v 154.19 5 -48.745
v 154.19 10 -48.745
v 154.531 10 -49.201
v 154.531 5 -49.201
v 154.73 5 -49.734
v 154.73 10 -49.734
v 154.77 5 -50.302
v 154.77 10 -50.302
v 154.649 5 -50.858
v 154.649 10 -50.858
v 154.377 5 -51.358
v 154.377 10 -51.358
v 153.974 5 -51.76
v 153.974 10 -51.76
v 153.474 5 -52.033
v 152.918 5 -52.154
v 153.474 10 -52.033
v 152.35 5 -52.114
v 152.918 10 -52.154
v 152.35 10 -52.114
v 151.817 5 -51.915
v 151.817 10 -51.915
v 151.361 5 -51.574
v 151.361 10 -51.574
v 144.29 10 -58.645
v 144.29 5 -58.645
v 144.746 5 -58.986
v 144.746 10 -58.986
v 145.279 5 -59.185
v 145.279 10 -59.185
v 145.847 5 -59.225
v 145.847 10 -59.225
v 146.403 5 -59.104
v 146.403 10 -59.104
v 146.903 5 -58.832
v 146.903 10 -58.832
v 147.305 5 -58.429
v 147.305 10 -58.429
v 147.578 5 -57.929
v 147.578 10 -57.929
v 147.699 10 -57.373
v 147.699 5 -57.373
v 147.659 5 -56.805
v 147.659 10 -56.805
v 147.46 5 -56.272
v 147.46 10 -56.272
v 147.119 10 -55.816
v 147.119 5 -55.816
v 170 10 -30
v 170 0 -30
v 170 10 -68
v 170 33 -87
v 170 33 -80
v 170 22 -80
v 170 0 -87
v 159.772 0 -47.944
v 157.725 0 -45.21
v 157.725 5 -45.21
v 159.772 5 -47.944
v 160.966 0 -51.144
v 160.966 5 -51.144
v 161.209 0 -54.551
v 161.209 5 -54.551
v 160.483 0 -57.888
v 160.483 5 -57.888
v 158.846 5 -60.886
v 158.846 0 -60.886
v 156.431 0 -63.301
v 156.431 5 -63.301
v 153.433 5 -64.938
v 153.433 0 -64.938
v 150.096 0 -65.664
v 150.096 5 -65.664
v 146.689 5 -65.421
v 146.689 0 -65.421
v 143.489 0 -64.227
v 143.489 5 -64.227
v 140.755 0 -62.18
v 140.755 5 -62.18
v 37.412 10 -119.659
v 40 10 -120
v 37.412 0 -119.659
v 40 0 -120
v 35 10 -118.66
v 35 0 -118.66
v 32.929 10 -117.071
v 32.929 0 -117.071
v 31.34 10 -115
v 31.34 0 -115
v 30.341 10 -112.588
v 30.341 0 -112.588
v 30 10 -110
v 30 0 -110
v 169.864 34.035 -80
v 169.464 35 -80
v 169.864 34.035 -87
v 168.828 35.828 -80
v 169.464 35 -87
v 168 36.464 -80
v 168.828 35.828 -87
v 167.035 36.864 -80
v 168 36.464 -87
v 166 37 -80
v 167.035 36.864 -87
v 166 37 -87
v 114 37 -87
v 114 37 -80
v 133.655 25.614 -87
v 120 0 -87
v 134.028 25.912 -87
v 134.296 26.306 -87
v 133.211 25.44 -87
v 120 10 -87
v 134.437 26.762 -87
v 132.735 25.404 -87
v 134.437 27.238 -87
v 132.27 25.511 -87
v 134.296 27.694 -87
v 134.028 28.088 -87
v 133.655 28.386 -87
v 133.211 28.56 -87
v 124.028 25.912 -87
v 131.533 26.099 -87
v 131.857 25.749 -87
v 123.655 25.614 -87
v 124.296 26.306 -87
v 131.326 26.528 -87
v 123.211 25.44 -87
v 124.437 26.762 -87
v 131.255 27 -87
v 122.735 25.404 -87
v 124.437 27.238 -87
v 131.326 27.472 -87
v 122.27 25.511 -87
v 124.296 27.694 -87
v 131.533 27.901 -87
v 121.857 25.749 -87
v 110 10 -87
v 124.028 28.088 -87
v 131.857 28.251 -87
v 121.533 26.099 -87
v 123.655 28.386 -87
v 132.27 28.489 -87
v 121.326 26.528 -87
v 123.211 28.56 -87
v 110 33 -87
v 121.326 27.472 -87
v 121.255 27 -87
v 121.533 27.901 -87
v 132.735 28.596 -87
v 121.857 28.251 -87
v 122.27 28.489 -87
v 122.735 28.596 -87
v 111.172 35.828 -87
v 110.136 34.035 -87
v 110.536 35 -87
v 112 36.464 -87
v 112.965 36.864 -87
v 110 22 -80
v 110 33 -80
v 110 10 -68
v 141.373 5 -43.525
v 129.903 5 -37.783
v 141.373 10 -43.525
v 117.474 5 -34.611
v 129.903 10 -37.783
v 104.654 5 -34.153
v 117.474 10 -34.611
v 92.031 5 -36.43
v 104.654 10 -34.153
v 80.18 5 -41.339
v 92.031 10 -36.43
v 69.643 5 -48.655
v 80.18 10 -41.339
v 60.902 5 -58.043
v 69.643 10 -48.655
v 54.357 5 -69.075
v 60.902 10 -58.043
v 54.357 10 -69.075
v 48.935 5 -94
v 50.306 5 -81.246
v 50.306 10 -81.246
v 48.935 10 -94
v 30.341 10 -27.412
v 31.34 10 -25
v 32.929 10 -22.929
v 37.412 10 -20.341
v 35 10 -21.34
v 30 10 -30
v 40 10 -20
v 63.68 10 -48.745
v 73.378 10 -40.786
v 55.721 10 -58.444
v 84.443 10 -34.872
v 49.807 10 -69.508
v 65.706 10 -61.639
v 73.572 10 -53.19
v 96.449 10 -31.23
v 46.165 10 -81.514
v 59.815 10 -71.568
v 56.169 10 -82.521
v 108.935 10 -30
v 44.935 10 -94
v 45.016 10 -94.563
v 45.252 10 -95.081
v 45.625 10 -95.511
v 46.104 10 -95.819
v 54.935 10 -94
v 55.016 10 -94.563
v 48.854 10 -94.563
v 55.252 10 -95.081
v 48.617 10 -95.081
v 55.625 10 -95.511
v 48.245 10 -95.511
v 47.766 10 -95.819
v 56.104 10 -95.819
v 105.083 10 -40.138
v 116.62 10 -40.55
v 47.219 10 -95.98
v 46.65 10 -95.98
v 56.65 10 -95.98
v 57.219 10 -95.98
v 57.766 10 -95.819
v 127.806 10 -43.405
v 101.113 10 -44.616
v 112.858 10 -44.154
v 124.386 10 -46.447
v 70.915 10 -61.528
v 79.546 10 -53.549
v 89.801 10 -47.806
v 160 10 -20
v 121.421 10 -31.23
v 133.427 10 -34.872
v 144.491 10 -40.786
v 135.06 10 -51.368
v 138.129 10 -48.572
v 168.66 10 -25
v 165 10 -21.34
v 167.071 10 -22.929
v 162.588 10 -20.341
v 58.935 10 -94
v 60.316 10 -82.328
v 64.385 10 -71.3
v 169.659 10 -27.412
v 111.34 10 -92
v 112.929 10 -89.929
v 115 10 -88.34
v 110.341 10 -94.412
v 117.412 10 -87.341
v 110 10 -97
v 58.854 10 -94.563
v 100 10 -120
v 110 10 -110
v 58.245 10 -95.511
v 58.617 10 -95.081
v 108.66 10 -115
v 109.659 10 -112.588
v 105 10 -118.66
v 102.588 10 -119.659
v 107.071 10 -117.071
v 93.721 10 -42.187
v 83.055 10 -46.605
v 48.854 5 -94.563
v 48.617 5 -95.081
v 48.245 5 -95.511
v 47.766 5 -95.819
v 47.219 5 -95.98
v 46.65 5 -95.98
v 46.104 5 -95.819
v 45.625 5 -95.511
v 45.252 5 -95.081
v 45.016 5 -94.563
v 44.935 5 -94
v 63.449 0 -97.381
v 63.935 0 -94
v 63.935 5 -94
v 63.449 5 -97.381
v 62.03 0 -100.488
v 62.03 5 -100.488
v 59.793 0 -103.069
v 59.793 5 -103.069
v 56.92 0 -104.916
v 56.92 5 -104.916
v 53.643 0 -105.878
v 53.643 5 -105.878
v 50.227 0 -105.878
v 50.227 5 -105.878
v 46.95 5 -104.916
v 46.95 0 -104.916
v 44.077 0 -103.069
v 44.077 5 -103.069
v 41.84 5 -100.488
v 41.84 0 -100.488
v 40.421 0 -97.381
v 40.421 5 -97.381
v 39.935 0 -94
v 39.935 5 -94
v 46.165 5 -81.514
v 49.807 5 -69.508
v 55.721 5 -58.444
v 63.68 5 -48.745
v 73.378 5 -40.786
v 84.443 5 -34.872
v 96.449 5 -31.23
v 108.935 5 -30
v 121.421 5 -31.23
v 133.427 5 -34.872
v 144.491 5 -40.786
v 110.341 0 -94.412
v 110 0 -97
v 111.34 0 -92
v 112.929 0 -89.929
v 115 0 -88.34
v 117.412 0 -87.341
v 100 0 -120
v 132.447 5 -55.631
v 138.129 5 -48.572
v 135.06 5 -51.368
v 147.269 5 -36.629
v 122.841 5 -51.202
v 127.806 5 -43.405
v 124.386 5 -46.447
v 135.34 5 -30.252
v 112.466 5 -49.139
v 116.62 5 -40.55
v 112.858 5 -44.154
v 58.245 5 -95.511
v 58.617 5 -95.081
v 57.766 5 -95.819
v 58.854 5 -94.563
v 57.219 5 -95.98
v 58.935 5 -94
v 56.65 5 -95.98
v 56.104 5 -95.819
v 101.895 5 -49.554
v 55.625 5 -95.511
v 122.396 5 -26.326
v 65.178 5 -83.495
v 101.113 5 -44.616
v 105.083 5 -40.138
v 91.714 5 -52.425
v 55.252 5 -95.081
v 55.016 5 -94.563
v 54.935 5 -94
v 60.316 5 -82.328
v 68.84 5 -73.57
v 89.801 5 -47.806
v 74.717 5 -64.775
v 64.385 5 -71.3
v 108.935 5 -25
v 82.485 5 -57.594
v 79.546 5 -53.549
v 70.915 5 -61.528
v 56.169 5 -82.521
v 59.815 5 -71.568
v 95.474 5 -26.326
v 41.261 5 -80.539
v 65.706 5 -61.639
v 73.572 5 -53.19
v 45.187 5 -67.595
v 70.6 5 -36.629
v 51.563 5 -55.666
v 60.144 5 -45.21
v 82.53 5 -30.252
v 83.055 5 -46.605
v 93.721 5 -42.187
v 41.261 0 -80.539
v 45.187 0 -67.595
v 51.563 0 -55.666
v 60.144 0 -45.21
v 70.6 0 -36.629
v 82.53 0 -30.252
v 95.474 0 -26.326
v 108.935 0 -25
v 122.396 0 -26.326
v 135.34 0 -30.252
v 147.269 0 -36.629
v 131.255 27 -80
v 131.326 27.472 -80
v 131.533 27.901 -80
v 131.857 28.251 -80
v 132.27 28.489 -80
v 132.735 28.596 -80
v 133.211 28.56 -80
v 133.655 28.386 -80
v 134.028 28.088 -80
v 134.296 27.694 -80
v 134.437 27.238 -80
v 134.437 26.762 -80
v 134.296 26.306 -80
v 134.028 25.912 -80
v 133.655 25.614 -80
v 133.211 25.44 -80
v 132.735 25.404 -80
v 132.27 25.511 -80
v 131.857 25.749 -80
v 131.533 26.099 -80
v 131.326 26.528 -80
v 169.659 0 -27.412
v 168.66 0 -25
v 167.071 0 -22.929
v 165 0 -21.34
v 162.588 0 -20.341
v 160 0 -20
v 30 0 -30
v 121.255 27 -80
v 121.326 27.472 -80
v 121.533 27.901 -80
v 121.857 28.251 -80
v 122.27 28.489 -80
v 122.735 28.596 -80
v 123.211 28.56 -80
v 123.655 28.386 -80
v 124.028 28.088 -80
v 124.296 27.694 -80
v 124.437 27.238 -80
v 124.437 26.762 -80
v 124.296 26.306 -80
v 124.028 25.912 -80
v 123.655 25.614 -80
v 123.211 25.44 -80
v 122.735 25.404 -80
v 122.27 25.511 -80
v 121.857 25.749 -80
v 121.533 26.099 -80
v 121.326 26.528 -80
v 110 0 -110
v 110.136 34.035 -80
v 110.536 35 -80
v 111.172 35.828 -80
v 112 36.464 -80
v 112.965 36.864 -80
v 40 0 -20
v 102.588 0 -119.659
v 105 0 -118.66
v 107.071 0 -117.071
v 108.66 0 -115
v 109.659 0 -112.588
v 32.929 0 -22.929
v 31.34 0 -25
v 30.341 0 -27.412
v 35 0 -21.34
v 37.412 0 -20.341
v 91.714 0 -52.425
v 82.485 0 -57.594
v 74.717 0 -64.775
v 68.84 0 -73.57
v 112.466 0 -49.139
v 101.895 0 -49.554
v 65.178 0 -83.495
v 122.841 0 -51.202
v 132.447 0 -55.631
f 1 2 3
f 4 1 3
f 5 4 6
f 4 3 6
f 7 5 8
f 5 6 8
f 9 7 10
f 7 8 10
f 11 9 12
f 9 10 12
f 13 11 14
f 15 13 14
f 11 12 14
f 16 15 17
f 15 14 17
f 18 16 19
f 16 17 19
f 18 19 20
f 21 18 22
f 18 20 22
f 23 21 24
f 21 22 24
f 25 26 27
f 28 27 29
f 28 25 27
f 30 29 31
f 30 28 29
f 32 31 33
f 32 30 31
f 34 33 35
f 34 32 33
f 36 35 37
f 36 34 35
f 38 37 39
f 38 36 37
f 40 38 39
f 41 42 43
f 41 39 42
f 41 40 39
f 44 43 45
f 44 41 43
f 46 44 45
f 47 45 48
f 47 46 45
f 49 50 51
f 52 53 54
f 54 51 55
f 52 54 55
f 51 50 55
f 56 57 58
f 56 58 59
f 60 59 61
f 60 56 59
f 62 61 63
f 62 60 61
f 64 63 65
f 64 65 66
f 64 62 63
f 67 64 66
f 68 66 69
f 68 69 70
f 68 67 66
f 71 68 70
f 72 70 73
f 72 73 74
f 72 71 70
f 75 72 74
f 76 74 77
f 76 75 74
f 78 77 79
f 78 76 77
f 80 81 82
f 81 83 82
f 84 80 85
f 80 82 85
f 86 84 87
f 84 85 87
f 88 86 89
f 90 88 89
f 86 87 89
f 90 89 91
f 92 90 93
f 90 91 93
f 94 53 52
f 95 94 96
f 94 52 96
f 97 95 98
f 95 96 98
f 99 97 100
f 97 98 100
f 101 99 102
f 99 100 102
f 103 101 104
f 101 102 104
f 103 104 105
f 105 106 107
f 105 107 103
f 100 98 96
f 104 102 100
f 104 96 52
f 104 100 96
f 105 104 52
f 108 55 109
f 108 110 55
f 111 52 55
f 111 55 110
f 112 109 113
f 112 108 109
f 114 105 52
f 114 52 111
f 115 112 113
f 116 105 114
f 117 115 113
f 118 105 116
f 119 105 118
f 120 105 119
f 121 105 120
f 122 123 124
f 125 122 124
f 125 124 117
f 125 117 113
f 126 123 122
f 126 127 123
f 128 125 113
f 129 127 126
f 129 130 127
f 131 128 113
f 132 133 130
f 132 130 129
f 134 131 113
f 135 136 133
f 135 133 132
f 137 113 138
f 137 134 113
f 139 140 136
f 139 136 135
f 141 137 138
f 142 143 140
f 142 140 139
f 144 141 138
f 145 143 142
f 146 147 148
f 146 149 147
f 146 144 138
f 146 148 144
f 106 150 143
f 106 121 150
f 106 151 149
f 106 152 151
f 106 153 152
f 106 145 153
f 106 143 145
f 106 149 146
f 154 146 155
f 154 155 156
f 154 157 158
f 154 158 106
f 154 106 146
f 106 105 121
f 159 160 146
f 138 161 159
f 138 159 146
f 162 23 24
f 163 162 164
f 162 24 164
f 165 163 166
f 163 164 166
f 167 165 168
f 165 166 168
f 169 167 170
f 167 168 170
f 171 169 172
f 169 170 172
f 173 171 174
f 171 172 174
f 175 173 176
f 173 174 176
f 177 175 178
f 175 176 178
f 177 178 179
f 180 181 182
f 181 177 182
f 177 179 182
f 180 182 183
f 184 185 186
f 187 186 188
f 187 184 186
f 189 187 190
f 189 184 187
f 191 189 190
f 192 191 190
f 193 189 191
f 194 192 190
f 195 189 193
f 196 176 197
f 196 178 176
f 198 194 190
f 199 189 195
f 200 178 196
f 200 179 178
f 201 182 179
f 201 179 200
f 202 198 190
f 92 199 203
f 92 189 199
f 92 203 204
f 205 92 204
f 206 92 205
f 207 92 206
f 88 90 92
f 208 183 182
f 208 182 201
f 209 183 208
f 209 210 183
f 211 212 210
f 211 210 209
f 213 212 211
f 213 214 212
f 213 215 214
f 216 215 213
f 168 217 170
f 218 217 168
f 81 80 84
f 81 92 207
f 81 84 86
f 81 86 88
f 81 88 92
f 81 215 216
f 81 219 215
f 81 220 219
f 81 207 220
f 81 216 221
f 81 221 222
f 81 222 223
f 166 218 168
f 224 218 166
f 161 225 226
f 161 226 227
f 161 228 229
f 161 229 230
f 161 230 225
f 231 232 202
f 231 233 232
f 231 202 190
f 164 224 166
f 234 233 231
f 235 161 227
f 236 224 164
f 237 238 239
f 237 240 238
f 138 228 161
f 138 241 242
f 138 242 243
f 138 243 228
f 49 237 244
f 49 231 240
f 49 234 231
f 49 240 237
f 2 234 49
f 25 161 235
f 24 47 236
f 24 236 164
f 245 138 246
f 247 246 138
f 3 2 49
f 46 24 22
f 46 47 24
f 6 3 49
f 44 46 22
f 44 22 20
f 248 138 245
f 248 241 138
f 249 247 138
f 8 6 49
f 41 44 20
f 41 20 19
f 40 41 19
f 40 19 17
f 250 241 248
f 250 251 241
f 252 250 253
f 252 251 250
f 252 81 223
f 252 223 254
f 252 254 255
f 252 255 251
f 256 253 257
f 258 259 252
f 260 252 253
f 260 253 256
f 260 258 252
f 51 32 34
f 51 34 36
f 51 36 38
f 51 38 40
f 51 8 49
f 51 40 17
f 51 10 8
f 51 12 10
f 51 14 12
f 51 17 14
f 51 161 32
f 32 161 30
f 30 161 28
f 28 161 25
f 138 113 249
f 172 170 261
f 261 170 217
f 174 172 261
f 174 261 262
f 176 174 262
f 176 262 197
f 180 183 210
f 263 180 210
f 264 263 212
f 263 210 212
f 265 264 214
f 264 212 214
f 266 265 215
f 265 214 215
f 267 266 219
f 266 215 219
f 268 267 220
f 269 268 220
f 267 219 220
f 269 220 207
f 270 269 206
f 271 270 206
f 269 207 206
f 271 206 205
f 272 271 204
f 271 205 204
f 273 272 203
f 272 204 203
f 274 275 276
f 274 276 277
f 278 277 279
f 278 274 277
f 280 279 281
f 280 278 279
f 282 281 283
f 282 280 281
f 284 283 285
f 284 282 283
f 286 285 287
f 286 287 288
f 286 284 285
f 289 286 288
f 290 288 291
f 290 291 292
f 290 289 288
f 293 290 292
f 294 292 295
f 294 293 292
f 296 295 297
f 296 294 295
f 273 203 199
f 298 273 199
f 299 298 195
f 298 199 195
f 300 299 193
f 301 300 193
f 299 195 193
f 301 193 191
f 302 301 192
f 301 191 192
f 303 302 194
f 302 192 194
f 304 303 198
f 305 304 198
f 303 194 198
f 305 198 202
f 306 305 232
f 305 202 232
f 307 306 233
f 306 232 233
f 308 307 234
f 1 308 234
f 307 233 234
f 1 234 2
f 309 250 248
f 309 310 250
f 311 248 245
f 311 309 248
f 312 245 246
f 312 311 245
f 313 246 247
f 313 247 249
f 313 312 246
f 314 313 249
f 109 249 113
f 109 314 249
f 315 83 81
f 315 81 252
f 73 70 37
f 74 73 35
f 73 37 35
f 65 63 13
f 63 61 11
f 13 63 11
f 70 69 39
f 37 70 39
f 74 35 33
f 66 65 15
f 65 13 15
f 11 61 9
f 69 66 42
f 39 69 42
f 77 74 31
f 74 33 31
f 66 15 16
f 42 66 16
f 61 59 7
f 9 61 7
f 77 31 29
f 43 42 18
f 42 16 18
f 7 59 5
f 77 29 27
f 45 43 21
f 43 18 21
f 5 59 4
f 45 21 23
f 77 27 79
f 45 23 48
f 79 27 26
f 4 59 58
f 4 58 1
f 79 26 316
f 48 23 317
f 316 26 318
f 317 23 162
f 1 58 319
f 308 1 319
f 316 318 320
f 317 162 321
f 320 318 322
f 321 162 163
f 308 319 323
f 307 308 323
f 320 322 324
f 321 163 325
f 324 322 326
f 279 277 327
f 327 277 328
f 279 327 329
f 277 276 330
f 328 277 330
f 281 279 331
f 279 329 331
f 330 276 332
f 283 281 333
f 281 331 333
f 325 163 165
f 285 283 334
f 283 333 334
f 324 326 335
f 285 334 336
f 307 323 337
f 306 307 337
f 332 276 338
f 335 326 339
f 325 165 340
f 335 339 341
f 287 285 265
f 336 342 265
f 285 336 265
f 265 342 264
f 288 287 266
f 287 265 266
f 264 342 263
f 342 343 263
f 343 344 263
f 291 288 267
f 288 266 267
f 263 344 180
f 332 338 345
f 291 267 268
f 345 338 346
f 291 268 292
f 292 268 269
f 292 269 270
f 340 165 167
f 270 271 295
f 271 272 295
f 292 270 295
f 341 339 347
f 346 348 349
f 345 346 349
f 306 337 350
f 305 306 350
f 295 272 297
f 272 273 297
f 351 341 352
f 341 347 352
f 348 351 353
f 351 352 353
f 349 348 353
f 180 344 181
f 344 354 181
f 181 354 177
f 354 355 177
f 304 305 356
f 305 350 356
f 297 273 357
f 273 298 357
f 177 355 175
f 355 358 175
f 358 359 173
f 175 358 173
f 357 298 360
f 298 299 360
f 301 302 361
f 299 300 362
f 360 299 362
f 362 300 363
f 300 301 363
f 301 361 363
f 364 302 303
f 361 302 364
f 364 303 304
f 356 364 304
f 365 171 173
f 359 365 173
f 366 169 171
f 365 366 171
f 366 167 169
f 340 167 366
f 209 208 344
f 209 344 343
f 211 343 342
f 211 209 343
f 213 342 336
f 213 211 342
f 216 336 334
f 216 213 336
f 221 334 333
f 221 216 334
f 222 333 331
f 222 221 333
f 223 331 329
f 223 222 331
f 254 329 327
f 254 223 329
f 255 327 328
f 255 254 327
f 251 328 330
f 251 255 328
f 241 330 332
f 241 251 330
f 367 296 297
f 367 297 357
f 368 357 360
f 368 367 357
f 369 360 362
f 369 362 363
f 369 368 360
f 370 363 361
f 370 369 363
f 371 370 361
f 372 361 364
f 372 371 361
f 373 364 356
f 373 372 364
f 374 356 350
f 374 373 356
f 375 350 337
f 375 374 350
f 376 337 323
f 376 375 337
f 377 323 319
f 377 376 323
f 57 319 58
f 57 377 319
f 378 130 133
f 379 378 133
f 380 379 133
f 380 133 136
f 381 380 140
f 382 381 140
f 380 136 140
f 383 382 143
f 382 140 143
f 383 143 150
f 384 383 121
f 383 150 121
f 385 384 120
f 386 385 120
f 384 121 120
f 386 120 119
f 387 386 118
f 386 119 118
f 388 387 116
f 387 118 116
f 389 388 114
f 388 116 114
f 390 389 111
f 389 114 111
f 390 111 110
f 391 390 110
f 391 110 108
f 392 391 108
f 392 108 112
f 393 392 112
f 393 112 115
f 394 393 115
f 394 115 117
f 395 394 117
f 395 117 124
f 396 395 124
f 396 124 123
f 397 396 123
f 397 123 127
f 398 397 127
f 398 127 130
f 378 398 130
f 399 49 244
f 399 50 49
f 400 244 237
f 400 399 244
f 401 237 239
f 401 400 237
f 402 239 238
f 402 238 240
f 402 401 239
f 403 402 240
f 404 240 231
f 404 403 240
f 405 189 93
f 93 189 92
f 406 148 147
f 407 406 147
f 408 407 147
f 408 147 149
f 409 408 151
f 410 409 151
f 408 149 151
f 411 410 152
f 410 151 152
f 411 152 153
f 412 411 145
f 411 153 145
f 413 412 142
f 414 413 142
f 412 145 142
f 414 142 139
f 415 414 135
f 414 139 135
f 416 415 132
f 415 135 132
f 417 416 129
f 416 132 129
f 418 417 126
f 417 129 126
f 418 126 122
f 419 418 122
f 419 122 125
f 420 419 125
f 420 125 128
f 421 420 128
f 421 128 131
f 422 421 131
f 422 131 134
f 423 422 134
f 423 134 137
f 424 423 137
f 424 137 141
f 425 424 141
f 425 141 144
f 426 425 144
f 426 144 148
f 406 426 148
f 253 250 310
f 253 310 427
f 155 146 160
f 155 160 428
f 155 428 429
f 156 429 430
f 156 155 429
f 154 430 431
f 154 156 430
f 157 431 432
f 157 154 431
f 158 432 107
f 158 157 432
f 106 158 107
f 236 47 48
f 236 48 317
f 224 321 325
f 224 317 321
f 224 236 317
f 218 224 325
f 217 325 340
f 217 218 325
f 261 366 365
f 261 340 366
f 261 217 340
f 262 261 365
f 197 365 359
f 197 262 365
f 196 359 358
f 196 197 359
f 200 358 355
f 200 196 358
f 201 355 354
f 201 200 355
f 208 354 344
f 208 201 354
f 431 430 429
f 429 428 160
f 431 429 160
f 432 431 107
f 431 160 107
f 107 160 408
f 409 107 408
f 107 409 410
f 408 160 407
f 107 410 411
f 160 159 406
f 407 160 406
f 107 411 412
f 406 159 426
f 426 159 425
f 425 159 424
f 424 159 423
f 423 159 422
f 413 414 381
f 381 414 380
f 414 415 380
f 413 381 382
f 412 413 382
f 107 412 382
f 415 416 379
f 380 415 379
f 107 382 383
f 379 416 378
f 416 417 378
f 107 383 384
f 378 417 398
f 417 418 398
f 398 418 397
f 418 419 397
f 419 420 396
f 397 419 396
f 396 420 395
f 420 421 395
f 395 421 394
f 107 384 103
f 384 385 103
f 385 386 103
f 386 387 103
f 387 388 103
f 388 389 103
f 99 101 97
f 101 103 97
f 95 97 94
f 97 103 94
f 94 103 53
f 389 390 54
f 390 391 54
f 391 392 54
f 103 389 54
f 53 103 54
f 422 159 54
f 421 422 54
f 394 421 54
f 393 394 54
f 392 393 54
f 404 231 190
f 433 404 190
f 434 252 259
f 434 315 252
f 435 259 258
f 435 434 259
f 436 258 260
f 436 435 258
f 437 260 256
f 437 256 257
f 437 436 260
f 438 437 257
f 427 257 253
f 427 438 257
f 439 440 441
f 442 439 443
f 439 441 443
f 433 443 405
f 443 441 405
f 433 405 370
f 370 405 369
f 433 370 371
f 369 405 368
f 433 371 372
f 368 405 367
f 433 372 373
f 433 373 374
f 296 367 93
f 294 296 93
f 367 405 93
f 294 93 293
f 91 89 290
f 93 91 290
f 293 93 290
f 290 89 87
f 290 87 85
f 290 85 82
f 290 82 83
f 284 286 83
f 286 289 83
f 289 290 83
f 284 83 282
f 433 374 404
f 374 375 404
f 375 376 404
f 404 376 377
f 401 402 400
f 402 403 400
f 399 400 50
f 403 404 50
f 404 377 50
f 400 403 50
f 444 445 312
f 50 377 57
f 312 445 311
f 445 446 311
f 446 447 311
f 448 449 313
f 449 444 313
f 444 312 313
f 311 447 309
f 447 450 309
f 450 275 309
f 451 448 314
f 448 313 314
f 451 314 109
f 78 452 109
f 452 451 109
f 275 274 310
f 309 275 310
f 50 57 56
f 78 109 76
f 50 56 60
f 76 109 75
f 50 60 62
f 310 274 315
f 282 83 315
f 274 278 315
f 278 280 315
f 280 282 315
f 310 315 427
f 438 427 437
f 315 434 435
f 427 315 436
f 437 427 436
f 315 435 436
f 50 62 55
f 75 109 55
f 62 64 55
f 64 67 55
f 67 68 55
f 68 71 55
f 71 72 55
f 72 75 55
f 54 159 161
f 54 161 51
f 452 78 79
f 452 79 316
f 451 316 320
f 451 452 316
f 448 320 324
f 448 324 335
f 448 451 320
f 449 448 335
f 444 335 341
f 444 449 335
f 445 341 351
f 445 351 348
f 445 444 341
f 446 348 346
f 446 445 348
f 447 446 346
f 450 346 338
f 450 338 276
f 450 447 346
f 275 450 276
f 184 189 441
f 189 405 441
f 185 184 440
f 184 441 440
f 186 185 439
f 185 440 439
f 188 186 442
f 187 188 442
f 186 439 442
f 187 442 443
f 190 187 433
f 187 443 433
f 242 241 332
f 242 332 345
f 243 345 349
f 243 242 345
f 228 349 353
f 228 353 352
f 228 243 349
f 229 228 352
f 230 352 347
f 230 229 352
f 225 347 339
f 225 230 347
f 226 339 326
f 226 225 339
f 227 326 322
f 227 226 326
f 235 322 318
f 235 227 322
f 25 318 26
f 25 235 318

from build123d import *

# Parameters (mm, degrees)
SKETCH1_W           = 170
SKETCH1_H           = 120
BOSS_EXTRUDE1_DEPTH = 10
SKETCH2_W           = 60
SKETCH2_H           = 40
BOSS_EXTRUDE2_DEPTH = 2
SKETCH3_W           = 60
SKETCH3_H           = 8
BOSS_EXTRUDE3_DEPTH = 25
SKETCH4_R           = 1.6
CUT_EXTRUDE1_DEPTH  = 10
CUT_EXTRUDE2_DEPTH  = 36
CHAMFER1_SIZE       = 12
FILLET4_R           = 4
CHAMFER2_SIZE       = 3
CUT_EXTRUDE4_DEPTH  = 5
CUT_EXTRUDE5_DEPTH  = 19
FILLET5_R           = 10
CUT_EXTRUDE6_DEPTH  = 91
FILLET6_R           = 10


with BuildPart() as part:
    # Sketch1 → Boss-Extrude1 (new body)
    with BuildSketch(Plane(origin=(0, 0, 0), x_dir=(1, 0, 0), z_dir=(0, 1, 0))):
        with Locations((85, 60)):
            Rectangle(SKETCH1_W, SKETCH1_H)
    extrude(amount=BOSS_EXTRUDE1_DEPTH)

    # Sketch2 → Boss-Extrude2 (add)
    with BuildSketch(Plane(origin=(0, 10, 0), x_dir=(1, 0, 0), z_dir=(0, 1, 0))):
        with Locations((140, 100)):
            Rectangle(SKETCH2_W, SKETCH2_H)
    extrude(amount=BOSS_EXTRUDE2_DEPTH)

    # Sketch3 → Boss-Extrude3 (add)
    with BuildSketch(Plane(origin=(0, 12, 0), x_dir=(1, 0, 0), z_dir=(0, 1, 0))):
        with Locations((140, 84)):
            Rectangle(SKETCH3_W, SKETCH3_H)
    extrude(amount=BOSS_EXTRUDE3_DEPTH)

    # Sketch4 → Cut-Extrude1 (cut)
    with BuildSketch(Plane(origin=(0, 0, -88), x_dir=(-1, 0, 0), z_dir=(0, 0, -1))):
        with Locations((-132.854949503, 27)):
            Circle(SKETCH4_R)
        with Locations((-122.854949503, 27)):
            Circle(SKETCH4_R)
    extrude(amount=-CUT_EXTRUDE1_DEPTH, mode=Mode.SUBTRACT)

    # Sketch5 → Cut-Extrude2 (cut)
    with BuildSketch(Plane(origin=(0, 10, 0), x_dir=(1, 0, 0), z_dir=(0, 1, 0))):
        with BuildLine():
            ThreePointArc((44.934842869, 94), (84.443103198, 34.871709919), (154.189676865, 48.745166004))
            ThreePointArc((154.189676865, 48.745166004), (154.189676865, 51.573593129), (151.361249741, 51.573593129))
            ThreePointArc((151.361249741, 51.573593129), (85.973836928, 38.567228049), (48.934842869, 94))
            ThreePointArc((48.934842869, 94), (46.934842869, 96), (44.934842869, 94))
        make_face()
        with BuildLine():
            ThreePointArc((58.934842869, 94), (89.800671251, 47.806023374), (144.290181929, 58.644660941))
            ThreePointArc((144.290181929, 58.644660941), (147.118609054, 58.644660941), (147.118609054, 55.816233816))
            ThreePointArc((147.118609054, 55.816233816), (88.269937522, 44.110505244), (54.934842869, 94))
            ThreePointArc((54.934842869, 94), (56.934842869, 96), (58.934842869, 94))
        make_face()
    extrude(amount=-CUT_EXTRUDE2_DEPTH, mode=Mode.SUBTRACT)

    # Chamfer1
    chamfer1_edges = [part.edges().sort_by_distance(p)[0] for p in [
        (140, 10, -80),
    ]]
    chamfer(chamfer1_edges, length=CHAMFER1_SIZE)

    # Fillet4
    fillet4_edges = [part.edges().sort_by_distance(p)[0] for p in [
        (170, 37, -84),
        (110, 37, -84),
    ]]
    fillet(fillet4_edges, radius=FILLET4_R)

    # Chamfer2
    chamfer2_edges = [part.edges().sort_by_distance(p)[0] for p in [
        (140, 12, -88),
    ]]
    chamfer(chamfer2_edges, length=CHAMFER2_SIZE)

    # Sketch7 → Cut-Extrude4 (cut)
    with BuildSketch(Plane.XZ):
        with BuildLine():
            ThreePointArc((140.754648023, -62.180194847), (91.714088413, -52.425421037), (63.934842869, -94))
            ThreePointArc((63.934842869, -94), (51.934842869, -106), (39.934842869, -94))
            ThreePointArc((39.934842869, -94), (82.529686036, -30.252312257), (157.725210771, -45.209632098))
            ThreePointArc((157.725210771, -45.209632098), (157.725210771, -62.180194847), (140.754648023, -62.180194847))
        make_face()
    extrude(amount=-CUT_EXTRUDE4_DEPTH, mode=Mode.SUBTRACT)

    # Sketch8 → Cut-Extrude5 (cut)
    with BuildSketch(Plane(origin=(0, 10, 0), x_dir=(1, 0, 0), z_dir=(0, 1, 0))):
        Polygon((0, 0), (30, 0), (170, 0), (170, 20), (30, 20), (30, 120), (0, 120), align=None)
    extrude(amount=-CUT_EXTRUDE5_DEPTH, mode=Mode.SUBTRACT)

    # Fillet5
    fillet5_edges = [part.edges().sort_by_distance(p)[0] for p in [
        (30, 5, -120),
        (170, 5, -20),
        (110, 11, -120),
        (30, 5, -20),
        (170, 6, -120),
    ]]
    fillet(fillet5_edges, radius=FILLET5_R)

    # Sketch9 → Cut-Extrude6 (cut)
    with BuildSketch(Plane(origin=(0, 37, 0), x_dir=(1, 0, 0), z_dir=(0, 1, 0))):
        Polygon((170, 88), (170, 87), (110, 87), (110, 138.435407066), (206.694052757, 135.310318366), align=None)
    extrude(amount=-CUT_EXTRUDE6_DEPTH, mode=Mode.SUBTRACT)

    # Fillet6
    fillet6_edges = [part.edges().sort_by_distance(p)[0] for p in [
        (110, 5, -87),
        (110, 5, -120),
    ]]
    fillet(fillet6_edges, radius=FILLET6_R)


solid = part.part
